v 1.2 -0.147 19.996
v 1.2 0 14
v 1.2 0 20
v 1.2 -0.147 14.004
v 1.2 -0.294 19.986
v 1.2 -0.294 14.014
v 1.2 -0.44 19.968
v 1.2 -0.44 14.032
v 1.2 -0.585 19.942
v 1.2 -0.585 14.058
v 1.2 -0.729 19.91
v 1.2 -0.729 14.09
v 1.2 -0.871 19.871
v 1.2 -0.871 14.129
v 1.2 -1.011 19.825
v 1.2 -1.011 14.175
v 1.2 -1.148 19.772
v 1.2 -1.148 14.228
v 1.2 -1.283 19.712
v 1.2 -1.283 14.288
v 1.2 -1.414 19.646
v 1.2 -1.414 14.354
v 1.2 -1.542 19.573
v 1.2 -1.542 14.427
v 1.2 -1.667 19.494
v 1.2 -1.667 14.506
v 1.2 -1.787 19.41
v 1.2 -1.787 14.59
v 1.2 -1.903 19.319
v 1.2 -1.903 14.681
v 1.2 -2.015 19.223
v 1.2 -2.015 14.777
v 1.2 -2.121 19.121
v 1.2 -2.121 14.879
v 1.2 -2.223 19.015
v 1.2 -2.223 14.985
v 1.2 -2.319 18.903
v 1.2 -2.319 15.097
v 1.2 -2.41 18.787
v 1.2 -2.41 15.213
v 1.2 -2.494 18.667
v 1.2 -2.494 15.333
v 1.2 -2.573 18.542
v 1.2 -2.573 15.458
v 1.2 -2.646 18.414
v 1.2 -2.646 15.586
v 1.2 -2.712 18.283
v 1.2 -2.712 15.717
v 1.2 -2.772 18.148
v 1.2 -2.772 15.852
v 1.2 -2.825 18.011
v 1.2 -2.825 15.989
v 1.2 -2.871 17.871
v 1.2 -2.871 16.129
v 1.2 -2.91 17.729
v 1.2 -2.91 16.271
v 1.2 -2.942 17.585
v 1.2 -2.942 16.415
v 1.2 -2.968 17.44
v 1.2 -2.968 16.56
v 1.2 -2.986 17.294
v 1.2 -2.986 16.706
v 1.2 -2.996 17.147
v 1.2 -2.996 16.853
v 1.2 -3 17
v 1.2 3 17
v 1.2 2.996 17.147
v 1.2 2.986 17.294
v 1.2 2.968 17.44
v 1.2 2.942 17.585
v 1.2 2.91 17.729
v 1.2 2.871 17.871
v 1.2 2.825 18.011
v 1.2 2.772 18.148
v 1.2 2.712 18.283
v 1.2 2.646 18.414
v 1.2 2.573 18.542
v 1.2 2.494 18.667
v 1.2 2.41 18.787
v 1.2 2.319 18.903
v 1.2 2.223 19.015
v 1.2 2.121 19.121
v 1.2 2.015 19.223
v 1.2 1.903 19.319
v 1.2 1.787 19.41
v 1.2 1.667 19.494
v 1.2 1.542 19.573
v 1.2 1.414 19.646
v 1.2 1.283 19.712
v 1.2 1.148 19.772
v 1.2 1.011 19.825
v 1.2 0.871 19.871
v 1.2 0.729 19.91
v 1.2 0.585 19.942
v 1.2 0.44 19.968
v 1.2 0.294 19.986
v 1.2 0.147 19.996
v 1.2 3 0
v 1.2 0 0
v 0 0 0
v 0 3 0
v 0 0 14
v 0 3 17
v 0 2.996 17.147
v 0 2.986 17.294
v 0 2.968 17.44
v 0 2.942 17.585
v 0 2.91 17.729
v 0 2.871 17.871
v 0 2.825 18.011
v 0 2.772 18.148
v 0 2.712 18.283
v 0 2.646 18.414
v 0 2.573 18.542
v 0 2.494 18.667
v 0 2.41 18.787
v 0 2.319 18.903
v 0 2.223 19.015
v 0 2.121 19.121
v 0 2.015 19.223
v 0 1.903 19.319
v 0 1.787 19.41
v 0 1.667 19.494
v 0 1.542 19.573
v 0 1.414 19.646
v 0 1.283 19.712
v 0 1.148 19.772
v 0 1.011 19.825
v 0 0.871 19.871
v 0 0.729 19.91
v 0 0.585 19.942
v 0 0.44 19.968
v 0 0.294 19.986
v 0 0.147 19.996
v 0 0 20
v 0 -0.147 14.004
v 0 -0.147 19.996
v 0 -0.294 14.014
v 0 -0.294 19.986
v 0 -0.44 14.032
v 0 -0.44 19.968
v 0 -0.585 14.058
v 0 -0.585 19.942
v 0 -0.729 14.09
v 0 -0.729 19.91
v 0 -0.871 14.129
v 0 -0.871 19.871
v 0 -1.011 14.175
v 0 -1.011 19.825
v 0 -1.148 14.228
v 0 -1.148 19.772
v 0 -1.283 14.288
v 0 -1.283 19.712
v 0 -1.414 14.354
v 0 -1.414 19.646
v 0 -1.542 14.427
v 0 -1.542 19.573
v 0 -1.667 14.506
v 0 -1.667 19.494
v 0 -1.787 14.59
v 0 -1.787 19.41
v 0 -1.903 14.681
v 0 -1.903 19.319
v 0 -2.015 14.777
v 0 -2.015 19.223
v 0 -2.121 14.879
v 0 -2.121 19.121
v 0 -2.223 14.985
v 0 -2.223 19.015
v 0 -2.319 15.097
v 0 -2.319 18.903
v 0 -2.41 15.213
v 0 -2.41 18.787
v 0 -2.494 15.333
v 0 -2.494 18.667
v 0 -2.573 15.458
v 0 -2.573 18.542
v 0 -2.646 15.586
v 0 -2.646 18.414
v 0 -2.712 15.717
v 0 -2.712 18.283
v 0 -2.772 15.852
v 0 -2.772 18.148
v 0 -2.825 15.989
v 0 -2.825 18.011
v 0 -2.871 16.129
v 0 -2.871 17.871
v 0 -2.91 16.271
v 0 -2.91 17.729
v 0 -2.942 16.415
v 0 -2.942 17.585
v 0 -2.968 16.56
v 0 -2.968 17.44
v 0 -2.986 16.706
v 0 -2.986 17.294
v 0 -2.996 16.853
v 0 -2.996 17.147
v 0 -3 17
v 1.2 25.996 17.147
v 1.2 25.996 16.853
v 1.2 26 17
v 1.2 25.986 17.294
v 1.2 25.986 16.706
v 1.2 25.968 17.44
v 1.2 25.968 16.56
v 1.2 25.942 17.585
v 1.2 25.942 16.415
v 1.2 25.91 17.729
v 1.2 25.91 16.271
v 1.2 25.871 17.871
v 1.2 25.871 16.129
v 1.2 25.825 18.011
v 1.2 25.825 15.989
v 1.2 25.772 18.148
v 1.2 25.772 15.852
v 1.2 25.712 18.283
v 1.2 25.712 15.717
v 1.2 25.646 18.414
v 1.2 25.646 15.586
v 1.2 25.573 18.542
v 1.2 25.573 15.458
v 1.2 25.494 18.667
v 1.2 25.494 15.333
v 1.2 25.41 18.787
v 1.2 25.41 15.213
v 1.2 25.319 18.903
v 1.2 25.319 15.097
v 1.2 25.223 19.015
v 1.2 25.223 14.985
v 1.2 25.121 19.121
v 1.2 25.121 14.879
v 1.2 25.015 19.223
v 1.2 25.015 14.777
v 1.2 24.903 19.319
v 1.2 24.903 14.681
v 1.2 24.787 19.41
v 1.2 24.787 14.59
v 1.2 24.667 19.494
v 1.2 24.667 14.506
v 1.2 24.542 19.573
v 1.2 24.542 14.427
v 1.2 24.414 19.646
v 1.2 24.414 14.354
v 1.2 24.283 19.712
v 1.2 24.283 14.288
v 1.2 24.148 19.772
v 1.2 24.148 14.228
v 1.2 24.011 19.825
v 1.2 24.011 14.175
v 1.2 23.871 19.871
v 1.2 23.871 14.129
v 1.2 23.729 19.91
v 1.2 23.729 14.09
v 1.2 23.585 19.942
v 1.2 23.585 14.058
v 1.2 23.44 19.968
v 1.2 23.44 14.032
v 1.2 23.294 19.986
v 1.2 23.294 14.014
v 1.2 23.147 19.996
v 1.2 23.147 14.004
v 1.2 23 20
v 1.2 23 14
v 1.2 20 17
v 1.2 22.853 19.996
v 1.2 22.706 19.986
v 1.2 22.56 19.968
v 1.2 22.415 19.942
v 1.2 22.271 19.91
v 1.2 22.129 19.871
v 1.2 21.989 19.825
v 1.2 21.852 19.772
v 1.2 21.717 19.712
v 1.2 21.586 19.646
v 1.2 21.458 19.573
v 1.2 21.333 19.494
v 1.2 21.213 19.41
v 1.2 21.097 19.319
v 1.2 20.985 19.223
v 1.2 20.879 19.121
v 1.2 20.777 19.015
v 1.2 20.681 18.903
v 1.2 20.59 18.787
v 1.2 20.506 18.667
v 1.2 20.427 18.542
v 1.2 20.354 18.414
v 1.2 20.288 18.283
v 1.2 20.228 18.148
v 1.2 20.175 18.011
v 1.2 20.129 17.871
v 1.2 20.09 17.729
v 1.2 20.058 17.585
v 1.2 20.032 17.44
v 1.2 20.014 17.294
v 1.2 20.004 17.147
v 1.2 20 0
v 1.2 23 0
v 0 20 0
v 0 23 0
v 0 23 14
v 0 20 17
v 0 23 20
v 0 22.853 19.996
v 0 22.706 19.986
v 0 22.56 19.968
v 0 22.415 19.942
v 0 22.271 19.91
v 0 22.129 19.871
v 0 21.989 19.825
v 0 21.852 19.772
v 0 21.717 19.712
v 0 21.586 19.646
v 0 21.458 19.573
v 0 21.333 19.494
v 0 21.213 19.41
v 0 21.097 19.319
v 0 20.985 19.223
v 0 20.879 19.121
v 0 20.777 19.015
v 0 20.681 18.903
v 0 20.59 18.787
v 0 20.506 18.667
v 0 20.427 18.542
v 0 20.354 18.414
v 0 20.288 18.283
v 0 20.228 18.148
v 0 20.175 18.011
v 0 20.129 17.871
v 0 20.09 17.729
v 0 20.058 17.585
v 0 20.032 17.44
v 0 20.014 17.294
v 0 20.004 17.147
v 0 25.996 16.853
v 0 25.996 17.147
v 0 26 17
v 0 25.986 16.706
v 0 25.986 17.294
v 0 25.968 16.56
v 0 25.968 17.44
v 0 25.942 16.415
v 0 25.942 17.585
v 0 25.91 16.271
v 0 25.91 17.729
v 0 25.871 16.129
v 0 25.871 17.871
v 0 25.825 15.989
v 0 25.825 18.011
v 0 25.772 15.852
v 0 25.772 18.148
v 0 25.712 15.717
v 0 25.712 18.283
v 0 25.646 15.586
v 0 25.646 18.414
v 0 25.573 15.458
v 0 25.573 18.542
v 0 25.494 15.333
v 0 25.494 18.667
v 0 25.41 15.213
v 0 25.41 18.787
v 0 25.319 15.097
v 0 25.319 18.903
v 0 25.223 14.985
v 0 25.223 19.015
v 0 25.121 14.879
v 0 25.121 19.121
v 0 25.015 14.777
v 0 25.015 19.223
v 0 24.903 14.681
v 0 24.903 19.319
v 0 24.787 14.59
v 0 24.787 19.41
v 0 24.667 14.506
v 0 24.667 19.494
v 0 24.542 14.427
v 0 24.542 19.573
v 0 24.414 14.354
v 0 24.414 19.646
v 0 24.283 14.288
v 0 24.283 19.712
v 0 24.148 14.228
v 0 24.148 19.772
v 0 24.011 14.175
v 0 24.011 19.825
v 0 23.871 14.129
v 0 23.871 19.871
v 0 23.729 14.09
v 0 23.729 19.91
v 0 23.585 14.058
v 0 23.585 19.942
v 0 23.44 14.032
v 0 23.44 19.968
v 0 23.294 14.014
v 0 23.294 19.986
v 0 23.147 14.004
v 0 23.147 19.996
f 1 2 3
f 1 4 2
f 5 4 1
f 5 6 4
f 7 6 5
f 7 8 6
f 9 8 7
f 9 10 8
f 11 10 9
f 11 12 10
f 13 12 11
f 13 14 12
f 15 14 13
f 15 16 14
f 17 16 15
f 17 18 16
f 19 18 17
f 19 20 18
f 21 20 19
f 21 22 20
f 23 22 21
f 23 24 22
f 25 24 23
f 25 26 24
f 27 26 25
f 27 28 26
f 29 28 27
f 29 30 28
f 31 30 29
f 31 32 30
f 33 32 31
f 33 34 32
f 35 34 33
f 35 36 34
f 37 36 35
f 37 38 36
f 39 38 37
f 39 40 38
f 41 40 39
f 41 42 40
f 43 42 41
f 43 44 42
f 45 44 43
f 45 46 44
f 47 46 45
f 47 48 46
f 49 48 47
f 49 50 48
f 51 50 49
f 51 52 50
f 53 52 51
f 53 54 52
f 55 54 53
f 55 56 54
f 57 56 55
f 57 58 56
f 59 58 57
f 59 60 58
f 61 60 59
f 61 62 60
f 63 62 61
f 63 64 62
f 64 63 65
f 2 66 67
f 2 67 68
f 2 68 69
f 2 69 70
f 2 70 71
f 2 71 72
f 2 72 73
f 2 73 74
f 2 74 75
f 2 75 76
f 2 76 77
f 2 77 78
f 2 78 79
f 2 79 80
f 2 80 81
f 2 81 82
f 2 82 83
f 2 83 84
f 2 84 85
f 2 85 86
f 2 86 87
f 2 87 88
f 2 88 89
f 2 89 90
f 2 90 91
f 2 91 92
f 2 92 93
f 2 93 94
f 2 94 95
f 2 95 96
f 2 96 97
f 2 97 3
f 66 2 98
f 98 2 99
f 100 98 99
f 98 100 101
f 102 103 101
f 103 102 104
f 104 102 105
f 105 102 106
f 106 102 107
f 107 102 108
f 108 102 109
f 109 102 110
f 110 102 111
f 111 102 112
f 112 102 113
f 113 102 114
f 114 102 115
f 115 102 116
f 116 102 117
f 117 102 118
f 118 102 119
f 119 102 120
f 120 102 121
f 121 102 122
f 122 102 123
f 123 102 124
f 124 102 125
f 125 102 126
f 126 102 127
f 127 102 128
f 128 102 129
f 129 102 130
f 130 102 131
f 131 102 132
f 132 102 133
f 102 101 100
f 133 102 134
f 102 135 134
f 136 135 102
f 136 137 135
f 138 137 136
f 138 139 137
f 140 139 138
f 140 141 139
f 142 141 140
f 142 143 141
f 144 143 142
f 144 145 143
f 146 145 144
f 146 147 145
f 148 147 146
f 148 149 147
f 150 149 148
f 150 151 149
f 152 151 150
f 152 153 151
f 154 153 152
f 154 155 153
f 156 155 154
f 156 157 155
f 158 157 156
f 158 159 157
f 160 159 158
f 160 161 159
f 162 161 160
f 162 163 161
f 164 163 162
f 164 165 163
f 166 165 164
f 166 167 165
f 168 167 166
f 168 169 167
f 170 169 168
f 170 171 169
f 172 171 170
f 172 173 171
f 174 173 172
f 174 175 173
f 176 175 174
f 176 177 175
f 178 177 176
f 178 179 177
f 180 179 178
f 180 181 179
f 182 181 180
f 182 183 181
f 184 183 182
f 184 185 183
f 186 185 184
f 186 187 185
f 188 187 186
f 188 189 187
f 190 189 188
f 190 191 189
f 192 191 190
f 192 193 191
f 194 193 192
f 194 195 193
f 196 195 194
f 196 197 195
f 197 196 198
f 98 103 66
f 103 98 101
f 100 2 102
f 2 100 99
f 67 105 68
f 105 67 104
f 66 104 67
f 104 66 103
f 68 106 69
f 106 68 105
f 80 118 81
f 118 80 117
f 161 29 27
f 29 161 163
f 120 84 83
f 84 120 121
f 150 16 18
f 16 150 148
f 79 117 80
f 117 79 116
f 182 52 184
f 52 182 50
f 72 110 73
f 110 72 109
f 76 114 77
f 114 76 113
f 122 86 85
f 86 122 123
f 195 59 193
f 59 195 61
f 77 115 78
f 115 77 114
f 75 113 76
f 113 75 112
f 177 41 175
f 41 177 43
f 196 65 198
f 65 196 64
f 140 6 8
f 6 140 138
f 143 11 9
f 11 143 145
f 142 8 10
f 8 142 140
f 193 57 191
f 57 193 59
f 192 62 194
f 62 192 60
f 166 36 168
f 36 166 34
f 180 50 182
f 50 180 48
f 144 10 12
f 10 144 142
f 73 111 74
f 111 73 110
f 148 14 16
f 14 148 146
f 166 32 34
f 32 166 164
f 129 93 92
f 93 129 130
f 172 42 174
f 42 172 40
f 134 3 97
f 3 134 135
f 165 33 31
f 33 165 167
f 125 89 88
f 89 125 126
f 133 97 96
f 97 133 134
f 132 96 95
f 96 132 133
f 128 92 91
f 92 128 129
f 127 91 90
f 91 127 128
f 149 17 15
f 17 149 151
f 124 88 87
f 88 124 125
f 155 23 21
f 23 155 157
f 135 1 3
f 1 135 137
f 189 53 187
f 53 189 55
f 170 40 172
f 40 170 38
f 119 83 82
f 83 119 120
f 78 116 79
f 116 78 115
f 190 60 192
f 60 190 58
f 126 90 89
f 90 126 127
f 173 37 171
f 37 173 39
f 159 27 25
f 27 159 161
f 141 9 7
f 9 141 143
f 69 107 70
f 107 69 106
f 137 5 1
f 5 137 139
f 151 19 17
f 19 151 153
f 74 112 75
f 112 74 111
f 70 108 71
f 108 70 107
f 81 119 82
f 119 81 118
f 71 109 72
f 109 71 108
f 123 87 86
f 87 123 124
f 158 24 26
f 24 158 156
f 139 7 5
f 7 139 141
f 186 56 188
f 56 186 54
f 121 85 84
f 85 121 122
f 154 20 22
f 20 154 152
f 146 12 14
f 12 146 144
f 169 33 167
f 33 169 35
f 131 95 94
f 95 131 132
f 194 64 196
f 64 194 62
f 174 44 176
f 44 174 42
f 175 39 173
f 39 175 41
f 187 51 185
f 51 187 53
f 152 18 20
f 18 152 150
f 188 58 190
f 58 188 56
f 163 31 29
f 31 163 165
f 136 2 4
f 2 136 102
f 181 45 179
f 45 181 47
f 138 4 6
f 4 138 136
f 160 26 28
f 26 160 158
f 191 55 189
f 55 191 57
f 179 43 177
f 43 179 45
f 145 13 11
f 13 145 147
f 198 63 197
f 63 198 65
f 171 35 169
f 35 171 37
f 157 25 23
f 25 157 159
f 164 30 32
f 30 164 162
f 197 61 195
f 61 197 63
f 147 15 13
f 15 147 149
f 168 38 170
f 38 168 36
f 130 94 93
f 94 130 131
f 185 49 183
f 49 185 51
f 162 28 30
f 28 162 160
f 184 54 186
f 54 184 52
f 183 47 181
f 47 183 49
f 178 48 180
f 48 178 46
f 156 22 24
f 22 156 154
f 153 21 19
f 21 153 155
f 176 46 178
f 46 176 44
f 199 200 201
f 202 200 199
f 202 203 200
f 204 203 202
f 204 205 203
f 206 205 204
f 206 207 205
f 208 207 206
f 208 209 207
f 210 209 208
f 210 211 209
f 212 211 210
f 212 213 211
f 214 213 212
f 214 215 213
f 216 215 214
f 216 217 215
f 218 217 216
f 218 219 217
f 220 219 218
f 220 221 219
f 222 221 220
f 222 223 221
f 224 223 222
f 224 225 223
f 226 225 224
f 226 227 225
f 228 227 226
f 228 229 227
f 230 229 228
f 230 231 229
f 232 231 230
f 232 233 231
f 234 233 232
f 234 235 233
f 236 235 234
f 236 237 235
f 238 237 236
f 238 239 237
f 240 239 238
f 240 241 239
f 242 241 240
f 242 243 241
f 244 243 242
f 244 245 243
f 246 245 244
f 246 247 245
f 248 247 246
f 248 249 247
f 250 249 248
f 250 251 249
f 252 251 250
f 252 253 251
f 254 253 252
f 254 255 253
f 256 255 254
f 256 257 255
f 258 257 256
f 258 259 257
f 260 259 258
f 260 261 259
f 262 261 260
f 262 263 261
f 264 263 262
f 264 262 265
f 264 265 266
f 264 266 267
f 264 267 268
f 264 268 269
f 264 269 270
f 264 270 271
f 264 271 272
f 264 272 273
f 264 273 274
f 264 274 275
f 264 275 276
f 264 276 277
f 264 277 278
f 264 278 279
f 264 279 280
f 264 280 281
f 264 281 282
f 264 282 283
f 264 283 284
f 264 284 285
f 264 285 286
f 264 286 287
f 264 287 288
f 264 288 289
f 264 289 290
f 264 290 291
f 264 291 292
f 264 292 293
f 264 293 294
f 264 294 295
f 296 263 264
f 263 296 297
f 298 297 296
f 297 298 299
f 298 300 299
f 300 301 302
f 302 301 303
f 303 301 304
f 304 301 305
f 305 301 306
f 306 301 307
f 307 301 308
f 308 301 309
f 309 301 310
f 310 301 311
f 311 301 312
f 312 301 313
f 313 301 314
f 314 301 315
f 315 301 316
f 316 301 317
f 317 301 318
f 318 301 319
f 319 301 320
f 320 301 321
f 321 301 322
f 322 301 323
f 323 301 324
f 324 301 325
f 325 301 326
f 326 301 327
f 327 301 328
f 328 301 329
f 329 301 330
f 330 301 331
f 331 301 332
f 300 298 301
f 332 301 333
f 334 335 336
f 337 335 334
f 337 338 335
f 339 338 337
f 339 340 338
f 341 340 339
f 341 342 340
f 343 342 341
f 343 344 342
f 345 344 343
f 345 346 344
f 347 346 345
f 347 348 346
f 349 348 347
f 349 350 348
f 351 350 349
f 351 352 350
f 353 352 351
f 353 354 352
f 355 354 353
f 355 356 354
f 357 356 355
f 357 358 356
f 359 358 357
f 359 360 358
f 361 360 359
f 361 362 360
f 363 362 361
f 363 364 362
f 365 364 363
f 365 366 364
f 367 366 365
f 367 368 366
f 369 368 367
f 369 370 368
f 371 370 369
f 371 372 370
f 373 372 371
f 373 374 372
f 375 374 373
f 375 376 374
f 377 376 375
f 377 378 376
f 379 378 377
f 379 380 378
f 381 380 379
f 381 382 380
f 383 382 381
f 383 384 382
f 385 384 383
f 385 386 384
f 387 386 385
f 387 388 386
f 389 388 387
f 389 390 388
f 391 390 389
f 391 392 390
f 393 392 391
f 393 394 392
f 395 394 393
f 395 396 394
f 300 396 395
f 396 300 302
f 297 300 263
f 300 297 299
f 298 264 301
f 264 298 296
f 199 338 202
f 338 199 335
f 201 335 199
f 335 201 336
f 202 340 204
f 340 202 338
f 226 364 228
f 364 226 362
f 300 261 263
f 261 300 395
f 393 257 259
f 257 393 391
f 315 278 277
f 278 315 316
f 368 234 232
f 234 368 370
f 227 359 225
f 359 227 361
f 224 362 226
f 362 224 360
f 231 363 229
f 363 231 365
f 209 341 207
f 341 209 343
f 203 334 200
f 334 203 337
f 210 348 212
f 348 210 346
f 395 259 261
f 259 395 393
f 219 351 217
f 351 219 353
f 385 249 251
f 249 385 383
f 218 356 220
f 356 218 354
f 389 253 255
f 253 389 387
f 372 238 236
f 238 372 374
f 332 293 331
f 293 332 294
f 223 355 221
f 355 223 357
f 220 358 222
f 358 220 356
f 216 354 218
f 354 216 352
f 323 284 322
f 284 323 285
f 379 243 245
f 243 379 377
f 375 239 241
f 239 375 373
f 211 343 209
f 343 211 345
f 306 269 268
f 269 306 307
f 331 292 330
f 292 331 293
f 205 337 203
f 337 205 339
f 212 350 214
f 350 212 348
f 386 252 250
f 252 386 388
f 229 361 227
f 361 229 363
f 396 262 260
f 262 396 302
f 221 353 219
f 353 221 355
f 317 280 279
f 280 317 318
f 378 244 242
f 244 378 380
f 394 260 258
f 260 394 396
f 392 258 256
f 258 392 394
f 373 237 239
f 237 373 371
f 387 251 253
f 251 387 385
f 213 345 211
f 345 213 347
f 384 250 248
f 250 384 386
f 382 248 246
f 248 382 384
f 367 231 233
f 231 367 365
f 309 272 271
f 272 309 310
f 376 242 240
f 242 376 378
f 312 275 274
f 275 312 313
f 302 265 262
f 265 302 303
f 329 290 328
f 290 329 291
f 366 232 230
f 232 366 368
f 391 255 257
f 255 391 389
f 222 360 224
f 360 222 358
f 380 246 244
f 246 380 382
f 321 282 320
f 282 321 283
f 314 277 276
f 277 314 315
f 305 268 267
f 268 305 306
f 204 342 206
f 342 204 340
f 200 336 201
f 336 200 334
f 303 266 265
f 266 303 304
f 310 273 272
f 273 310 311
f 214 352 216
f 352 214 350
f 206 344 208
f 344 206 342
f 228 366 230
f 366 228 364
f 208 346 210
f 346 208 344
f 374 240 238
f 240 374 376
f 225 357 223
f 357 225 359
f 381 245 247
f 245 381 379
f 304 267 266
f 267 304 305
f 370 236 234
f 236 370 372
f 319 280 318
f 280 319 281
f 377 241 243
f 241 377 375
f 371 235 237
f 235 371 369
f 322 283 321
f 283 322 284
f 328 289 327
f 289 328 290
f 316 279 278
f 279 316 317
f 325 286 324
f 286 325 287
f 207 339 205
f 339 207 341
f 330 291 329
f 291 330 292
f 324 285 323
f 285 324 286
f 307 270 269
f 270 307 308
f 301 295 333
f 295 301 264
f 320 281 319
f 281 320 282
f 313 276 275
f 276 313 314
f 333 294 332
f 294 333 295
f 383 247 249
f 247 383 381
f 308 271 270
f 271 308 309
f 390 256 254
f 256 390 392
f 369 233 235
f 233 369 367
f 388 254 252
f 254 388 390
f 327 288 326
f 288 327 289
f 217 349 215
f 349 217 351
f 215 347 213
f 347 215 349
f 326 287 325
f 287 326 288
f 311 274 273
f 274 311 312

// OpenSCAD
// Black Orchestra
include <../lib/BoardGameSystem.scad>;

main_box_length = 286;// X
main_box_width = 286; // Y
main_box_height = 54; // Z
layer_height = 27;
empty_box_height = 68;
hex_bottom = 6;
no_hex = 0;
wallThickness = 1.2;
$fn = $preview ? 32 : 128;


// Game boards: Total size
main_board_height = 14;
main_board_width = 285;
main_board_length = 285;

// Event cards: 64 * 89,  7 stacks
module eventCardsBox() {
    box_height = main_box_height;
    event_box_width = 95;
    box_length = 286-56; // 230
    spacing = (box_length - 40.5) / 7;
    tokenBox(size=[box_length, event_box_width, main_box_height], hexBottom=no_hex, corner=1);
    // 53 degress 40.5 space
    slots = 7;
    for(i=[0:slots-1]) {        
        translate([40.5+(spacing*i),0,0]) {
        rotate([90-53,0,270]) {
        dividerCutout(size=[event_box_width, 65, wallThickness], corner=3, cutoutWidth=30, cutoutDepth=40);
        }
        }
    }
}

// Enemy markers + nazi leader tiles
module enemyMarkersBox() {
    enemy_box_height = main_box_height;
    enemy_box_width = 95;
    enemy_box_length = 55.5;
    tokenBox(size=[enemy_box_length, enemy_box_width, enemy_box_height], hexBottom=no_hex, corner=3);
}

// Conspirator cards: 
// Victory card
// Interrogation cards
module interrogationConspiratorCardBox() {
    rotate([0,0,270]) {    
        cardBox(size=[main_box_width-96,67, layer_height], corner=3, containers=2, cutoutWidth=20);
    }
}

// Conspirator sheets
module conspiritorSheetBox() {
    tokenBox(size=[135, main_box_width-96,  layer_height], hexBottom=hex_bottom, corner=3);
}

// Item tiles
// Difficulty tiles
// Dice
// Pawns + tracking cubes
module pawnsAndTiles() {
    tokenBox(size=[55.5,main_box_width-96,layer_height], hexBottom=0, corner=0, 
    containersX=1, containersY=3,
    wallThickness=1.2);
}
// Dice
module diceBox() {
    tokenBox(size=[67, 95, layer_height], corner=3);
}


// Red Orchestra
    // Event cards
    // Conspirator cards
    // Mission cards
    // Teleprinter tokens
    // Pamphlet + hideout token
    // Special item tiles
module redOrchestraBox() {
    difference() {
        length = 67*2;
        width = 95;
        cutoutWidth = 20;
        corner = 3;
        offset = width/2 - cutoutWidth/2 - corner;
        
        tokenBox(size=[length, width, layer_height], corner=corner, containersX=2);
        translate([0,offset,0])
            cube([1.2, cutoutWidth+(corner*2), layer_height]);
    }
    // Left side
    //rotate([90, 0, 0])
   // translate([(i*sectionWidth) + offset, boxHeight - corner, -wallThickness])
     //   cylinder(r=corner, h=wallThickness);
    
}
//redOrchestraBox();
//horstKopkowBox();
// Horst Kopkow
    // Event cards
    // Conspirator cards
    // Encounter cards
module horstKopkowBox() {
    rotate([0,0,270]) {    
        cardBox(size=[95, 67, layer_height], corner=3, containers=1, cutoutWidth=20);
    }
}

cutoutFill();
// Kreisau Circle
    // Event cards
    // Ally tiles
    // New item tiles



//include<Black_Orchestra.scad>;
